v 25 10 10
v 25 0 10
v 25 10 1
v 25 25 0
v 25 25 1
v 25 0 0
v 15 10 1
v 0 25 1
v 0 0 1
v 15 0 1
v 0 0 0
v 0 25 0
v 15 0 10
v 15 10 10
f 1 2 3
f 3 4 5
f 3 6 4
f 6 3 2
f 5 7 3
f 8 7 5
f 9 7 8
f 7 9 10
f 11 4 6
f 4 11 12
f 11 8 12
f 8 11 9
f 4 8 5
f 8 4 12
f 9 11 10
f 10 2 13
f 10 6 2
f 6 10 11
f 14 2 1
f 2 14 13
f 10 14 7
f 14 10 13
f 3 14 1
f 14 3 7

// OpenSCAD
$vpt = [ 0, 0, 12 ]; // translation de la vue par défaut
$vpr = [ 60, 0.00, 45 ]; // rotation de la vue par défaut
$vpd = 190;

// En dessous je ne modifie que si je comprends ce que je fais,
// et je demande à un animateur de regarder avec moi

O=0;o=O;
C=1;c=C;
V=2;v=V;

X=0;x=X;
Y=1;y=Y;
I=2;i=Y;

touraucentre = O;
tourenlongueur = C;

unseulcoin = y;



taille = 25;
interieur = 10;
hauteur = 30;
base_hauteur = 15;
epaisseur = 0.3;

module base(taille) {
    cube([taille,taille,epaisseur]);
}

module tour(interieur,hauteur,type) {
    if (type==O) {
        translate([(taille-interieur)/2,(taille-interieur)/2,0])
        cube([interieur,interieur,hauteur]);
    }
    if (type==C) {
        translate([(taille-interieur)/2,(taille-interieur)/2,0])
        cube([taille-((taille-interieur)/2),interieur,hauteur]);
    }
    if (type==V) {
        translate([(taille-interieur),0,0])
        cube([interieur,interieur,hauteur]);
    }
}

module moat(interieur,type) {
    if (type==O) {
        translate([(taille-interieur-2)/2,(taille-interieur-2)/2,0])
        cube([interieur+2,interieur+2,base_hauteur]);
    }
    if (type==C) {
        translate([(taille-interieur-2)/2,(taille-interieur-2)/2,0])
        cube([taille,interieur+2,base_hauteur]);
    }
    if (type==V) {
        translate([(taille-interieur)-2,0,0])
        cube([interieur+2,interieur+2,base_hauteur]);
    }
}

module coin(offset_x,offset_y) {
    translate([offset_x,offset_y,0])
    cube([(taille-interieur)/2,(taille-interieur)/2,base_hauteur]);
}

module base(taille,hauteur) {
    cube([taille,taille,hauteur]);
}

module bloc(type,coins,hauteurdelatour, hauteurdelabase) {

    difference() {
        union() {
            base(taille);
            difference() {
                base(taille,min(base_hauteur,hauteurdelabase));
                moat(interieur,type);
            }
            tour(interieur,min(hauteur,hauteurdelatour),type);
        }
        union() {
            if(coins>X) coin(0,0);
            if(coins>Y) coin(taille-(taille-interieur)/2,taille-(taille-interieur)/2);
        }
    }
}

// Ici c'est mon objet à moi: je peux changer les lignes entre
// les parenthèses

bloc(

// Je mets O, C ou V

type = V

,// Je mets X, Y ou I

coins = X

,// La hauteur de ma tour entre 0 et 30 mm

hauteurdelatour = 10

, // La hauteur de ma base entre 0 et 15 mm

hauteurdelabase = 0    

 );
